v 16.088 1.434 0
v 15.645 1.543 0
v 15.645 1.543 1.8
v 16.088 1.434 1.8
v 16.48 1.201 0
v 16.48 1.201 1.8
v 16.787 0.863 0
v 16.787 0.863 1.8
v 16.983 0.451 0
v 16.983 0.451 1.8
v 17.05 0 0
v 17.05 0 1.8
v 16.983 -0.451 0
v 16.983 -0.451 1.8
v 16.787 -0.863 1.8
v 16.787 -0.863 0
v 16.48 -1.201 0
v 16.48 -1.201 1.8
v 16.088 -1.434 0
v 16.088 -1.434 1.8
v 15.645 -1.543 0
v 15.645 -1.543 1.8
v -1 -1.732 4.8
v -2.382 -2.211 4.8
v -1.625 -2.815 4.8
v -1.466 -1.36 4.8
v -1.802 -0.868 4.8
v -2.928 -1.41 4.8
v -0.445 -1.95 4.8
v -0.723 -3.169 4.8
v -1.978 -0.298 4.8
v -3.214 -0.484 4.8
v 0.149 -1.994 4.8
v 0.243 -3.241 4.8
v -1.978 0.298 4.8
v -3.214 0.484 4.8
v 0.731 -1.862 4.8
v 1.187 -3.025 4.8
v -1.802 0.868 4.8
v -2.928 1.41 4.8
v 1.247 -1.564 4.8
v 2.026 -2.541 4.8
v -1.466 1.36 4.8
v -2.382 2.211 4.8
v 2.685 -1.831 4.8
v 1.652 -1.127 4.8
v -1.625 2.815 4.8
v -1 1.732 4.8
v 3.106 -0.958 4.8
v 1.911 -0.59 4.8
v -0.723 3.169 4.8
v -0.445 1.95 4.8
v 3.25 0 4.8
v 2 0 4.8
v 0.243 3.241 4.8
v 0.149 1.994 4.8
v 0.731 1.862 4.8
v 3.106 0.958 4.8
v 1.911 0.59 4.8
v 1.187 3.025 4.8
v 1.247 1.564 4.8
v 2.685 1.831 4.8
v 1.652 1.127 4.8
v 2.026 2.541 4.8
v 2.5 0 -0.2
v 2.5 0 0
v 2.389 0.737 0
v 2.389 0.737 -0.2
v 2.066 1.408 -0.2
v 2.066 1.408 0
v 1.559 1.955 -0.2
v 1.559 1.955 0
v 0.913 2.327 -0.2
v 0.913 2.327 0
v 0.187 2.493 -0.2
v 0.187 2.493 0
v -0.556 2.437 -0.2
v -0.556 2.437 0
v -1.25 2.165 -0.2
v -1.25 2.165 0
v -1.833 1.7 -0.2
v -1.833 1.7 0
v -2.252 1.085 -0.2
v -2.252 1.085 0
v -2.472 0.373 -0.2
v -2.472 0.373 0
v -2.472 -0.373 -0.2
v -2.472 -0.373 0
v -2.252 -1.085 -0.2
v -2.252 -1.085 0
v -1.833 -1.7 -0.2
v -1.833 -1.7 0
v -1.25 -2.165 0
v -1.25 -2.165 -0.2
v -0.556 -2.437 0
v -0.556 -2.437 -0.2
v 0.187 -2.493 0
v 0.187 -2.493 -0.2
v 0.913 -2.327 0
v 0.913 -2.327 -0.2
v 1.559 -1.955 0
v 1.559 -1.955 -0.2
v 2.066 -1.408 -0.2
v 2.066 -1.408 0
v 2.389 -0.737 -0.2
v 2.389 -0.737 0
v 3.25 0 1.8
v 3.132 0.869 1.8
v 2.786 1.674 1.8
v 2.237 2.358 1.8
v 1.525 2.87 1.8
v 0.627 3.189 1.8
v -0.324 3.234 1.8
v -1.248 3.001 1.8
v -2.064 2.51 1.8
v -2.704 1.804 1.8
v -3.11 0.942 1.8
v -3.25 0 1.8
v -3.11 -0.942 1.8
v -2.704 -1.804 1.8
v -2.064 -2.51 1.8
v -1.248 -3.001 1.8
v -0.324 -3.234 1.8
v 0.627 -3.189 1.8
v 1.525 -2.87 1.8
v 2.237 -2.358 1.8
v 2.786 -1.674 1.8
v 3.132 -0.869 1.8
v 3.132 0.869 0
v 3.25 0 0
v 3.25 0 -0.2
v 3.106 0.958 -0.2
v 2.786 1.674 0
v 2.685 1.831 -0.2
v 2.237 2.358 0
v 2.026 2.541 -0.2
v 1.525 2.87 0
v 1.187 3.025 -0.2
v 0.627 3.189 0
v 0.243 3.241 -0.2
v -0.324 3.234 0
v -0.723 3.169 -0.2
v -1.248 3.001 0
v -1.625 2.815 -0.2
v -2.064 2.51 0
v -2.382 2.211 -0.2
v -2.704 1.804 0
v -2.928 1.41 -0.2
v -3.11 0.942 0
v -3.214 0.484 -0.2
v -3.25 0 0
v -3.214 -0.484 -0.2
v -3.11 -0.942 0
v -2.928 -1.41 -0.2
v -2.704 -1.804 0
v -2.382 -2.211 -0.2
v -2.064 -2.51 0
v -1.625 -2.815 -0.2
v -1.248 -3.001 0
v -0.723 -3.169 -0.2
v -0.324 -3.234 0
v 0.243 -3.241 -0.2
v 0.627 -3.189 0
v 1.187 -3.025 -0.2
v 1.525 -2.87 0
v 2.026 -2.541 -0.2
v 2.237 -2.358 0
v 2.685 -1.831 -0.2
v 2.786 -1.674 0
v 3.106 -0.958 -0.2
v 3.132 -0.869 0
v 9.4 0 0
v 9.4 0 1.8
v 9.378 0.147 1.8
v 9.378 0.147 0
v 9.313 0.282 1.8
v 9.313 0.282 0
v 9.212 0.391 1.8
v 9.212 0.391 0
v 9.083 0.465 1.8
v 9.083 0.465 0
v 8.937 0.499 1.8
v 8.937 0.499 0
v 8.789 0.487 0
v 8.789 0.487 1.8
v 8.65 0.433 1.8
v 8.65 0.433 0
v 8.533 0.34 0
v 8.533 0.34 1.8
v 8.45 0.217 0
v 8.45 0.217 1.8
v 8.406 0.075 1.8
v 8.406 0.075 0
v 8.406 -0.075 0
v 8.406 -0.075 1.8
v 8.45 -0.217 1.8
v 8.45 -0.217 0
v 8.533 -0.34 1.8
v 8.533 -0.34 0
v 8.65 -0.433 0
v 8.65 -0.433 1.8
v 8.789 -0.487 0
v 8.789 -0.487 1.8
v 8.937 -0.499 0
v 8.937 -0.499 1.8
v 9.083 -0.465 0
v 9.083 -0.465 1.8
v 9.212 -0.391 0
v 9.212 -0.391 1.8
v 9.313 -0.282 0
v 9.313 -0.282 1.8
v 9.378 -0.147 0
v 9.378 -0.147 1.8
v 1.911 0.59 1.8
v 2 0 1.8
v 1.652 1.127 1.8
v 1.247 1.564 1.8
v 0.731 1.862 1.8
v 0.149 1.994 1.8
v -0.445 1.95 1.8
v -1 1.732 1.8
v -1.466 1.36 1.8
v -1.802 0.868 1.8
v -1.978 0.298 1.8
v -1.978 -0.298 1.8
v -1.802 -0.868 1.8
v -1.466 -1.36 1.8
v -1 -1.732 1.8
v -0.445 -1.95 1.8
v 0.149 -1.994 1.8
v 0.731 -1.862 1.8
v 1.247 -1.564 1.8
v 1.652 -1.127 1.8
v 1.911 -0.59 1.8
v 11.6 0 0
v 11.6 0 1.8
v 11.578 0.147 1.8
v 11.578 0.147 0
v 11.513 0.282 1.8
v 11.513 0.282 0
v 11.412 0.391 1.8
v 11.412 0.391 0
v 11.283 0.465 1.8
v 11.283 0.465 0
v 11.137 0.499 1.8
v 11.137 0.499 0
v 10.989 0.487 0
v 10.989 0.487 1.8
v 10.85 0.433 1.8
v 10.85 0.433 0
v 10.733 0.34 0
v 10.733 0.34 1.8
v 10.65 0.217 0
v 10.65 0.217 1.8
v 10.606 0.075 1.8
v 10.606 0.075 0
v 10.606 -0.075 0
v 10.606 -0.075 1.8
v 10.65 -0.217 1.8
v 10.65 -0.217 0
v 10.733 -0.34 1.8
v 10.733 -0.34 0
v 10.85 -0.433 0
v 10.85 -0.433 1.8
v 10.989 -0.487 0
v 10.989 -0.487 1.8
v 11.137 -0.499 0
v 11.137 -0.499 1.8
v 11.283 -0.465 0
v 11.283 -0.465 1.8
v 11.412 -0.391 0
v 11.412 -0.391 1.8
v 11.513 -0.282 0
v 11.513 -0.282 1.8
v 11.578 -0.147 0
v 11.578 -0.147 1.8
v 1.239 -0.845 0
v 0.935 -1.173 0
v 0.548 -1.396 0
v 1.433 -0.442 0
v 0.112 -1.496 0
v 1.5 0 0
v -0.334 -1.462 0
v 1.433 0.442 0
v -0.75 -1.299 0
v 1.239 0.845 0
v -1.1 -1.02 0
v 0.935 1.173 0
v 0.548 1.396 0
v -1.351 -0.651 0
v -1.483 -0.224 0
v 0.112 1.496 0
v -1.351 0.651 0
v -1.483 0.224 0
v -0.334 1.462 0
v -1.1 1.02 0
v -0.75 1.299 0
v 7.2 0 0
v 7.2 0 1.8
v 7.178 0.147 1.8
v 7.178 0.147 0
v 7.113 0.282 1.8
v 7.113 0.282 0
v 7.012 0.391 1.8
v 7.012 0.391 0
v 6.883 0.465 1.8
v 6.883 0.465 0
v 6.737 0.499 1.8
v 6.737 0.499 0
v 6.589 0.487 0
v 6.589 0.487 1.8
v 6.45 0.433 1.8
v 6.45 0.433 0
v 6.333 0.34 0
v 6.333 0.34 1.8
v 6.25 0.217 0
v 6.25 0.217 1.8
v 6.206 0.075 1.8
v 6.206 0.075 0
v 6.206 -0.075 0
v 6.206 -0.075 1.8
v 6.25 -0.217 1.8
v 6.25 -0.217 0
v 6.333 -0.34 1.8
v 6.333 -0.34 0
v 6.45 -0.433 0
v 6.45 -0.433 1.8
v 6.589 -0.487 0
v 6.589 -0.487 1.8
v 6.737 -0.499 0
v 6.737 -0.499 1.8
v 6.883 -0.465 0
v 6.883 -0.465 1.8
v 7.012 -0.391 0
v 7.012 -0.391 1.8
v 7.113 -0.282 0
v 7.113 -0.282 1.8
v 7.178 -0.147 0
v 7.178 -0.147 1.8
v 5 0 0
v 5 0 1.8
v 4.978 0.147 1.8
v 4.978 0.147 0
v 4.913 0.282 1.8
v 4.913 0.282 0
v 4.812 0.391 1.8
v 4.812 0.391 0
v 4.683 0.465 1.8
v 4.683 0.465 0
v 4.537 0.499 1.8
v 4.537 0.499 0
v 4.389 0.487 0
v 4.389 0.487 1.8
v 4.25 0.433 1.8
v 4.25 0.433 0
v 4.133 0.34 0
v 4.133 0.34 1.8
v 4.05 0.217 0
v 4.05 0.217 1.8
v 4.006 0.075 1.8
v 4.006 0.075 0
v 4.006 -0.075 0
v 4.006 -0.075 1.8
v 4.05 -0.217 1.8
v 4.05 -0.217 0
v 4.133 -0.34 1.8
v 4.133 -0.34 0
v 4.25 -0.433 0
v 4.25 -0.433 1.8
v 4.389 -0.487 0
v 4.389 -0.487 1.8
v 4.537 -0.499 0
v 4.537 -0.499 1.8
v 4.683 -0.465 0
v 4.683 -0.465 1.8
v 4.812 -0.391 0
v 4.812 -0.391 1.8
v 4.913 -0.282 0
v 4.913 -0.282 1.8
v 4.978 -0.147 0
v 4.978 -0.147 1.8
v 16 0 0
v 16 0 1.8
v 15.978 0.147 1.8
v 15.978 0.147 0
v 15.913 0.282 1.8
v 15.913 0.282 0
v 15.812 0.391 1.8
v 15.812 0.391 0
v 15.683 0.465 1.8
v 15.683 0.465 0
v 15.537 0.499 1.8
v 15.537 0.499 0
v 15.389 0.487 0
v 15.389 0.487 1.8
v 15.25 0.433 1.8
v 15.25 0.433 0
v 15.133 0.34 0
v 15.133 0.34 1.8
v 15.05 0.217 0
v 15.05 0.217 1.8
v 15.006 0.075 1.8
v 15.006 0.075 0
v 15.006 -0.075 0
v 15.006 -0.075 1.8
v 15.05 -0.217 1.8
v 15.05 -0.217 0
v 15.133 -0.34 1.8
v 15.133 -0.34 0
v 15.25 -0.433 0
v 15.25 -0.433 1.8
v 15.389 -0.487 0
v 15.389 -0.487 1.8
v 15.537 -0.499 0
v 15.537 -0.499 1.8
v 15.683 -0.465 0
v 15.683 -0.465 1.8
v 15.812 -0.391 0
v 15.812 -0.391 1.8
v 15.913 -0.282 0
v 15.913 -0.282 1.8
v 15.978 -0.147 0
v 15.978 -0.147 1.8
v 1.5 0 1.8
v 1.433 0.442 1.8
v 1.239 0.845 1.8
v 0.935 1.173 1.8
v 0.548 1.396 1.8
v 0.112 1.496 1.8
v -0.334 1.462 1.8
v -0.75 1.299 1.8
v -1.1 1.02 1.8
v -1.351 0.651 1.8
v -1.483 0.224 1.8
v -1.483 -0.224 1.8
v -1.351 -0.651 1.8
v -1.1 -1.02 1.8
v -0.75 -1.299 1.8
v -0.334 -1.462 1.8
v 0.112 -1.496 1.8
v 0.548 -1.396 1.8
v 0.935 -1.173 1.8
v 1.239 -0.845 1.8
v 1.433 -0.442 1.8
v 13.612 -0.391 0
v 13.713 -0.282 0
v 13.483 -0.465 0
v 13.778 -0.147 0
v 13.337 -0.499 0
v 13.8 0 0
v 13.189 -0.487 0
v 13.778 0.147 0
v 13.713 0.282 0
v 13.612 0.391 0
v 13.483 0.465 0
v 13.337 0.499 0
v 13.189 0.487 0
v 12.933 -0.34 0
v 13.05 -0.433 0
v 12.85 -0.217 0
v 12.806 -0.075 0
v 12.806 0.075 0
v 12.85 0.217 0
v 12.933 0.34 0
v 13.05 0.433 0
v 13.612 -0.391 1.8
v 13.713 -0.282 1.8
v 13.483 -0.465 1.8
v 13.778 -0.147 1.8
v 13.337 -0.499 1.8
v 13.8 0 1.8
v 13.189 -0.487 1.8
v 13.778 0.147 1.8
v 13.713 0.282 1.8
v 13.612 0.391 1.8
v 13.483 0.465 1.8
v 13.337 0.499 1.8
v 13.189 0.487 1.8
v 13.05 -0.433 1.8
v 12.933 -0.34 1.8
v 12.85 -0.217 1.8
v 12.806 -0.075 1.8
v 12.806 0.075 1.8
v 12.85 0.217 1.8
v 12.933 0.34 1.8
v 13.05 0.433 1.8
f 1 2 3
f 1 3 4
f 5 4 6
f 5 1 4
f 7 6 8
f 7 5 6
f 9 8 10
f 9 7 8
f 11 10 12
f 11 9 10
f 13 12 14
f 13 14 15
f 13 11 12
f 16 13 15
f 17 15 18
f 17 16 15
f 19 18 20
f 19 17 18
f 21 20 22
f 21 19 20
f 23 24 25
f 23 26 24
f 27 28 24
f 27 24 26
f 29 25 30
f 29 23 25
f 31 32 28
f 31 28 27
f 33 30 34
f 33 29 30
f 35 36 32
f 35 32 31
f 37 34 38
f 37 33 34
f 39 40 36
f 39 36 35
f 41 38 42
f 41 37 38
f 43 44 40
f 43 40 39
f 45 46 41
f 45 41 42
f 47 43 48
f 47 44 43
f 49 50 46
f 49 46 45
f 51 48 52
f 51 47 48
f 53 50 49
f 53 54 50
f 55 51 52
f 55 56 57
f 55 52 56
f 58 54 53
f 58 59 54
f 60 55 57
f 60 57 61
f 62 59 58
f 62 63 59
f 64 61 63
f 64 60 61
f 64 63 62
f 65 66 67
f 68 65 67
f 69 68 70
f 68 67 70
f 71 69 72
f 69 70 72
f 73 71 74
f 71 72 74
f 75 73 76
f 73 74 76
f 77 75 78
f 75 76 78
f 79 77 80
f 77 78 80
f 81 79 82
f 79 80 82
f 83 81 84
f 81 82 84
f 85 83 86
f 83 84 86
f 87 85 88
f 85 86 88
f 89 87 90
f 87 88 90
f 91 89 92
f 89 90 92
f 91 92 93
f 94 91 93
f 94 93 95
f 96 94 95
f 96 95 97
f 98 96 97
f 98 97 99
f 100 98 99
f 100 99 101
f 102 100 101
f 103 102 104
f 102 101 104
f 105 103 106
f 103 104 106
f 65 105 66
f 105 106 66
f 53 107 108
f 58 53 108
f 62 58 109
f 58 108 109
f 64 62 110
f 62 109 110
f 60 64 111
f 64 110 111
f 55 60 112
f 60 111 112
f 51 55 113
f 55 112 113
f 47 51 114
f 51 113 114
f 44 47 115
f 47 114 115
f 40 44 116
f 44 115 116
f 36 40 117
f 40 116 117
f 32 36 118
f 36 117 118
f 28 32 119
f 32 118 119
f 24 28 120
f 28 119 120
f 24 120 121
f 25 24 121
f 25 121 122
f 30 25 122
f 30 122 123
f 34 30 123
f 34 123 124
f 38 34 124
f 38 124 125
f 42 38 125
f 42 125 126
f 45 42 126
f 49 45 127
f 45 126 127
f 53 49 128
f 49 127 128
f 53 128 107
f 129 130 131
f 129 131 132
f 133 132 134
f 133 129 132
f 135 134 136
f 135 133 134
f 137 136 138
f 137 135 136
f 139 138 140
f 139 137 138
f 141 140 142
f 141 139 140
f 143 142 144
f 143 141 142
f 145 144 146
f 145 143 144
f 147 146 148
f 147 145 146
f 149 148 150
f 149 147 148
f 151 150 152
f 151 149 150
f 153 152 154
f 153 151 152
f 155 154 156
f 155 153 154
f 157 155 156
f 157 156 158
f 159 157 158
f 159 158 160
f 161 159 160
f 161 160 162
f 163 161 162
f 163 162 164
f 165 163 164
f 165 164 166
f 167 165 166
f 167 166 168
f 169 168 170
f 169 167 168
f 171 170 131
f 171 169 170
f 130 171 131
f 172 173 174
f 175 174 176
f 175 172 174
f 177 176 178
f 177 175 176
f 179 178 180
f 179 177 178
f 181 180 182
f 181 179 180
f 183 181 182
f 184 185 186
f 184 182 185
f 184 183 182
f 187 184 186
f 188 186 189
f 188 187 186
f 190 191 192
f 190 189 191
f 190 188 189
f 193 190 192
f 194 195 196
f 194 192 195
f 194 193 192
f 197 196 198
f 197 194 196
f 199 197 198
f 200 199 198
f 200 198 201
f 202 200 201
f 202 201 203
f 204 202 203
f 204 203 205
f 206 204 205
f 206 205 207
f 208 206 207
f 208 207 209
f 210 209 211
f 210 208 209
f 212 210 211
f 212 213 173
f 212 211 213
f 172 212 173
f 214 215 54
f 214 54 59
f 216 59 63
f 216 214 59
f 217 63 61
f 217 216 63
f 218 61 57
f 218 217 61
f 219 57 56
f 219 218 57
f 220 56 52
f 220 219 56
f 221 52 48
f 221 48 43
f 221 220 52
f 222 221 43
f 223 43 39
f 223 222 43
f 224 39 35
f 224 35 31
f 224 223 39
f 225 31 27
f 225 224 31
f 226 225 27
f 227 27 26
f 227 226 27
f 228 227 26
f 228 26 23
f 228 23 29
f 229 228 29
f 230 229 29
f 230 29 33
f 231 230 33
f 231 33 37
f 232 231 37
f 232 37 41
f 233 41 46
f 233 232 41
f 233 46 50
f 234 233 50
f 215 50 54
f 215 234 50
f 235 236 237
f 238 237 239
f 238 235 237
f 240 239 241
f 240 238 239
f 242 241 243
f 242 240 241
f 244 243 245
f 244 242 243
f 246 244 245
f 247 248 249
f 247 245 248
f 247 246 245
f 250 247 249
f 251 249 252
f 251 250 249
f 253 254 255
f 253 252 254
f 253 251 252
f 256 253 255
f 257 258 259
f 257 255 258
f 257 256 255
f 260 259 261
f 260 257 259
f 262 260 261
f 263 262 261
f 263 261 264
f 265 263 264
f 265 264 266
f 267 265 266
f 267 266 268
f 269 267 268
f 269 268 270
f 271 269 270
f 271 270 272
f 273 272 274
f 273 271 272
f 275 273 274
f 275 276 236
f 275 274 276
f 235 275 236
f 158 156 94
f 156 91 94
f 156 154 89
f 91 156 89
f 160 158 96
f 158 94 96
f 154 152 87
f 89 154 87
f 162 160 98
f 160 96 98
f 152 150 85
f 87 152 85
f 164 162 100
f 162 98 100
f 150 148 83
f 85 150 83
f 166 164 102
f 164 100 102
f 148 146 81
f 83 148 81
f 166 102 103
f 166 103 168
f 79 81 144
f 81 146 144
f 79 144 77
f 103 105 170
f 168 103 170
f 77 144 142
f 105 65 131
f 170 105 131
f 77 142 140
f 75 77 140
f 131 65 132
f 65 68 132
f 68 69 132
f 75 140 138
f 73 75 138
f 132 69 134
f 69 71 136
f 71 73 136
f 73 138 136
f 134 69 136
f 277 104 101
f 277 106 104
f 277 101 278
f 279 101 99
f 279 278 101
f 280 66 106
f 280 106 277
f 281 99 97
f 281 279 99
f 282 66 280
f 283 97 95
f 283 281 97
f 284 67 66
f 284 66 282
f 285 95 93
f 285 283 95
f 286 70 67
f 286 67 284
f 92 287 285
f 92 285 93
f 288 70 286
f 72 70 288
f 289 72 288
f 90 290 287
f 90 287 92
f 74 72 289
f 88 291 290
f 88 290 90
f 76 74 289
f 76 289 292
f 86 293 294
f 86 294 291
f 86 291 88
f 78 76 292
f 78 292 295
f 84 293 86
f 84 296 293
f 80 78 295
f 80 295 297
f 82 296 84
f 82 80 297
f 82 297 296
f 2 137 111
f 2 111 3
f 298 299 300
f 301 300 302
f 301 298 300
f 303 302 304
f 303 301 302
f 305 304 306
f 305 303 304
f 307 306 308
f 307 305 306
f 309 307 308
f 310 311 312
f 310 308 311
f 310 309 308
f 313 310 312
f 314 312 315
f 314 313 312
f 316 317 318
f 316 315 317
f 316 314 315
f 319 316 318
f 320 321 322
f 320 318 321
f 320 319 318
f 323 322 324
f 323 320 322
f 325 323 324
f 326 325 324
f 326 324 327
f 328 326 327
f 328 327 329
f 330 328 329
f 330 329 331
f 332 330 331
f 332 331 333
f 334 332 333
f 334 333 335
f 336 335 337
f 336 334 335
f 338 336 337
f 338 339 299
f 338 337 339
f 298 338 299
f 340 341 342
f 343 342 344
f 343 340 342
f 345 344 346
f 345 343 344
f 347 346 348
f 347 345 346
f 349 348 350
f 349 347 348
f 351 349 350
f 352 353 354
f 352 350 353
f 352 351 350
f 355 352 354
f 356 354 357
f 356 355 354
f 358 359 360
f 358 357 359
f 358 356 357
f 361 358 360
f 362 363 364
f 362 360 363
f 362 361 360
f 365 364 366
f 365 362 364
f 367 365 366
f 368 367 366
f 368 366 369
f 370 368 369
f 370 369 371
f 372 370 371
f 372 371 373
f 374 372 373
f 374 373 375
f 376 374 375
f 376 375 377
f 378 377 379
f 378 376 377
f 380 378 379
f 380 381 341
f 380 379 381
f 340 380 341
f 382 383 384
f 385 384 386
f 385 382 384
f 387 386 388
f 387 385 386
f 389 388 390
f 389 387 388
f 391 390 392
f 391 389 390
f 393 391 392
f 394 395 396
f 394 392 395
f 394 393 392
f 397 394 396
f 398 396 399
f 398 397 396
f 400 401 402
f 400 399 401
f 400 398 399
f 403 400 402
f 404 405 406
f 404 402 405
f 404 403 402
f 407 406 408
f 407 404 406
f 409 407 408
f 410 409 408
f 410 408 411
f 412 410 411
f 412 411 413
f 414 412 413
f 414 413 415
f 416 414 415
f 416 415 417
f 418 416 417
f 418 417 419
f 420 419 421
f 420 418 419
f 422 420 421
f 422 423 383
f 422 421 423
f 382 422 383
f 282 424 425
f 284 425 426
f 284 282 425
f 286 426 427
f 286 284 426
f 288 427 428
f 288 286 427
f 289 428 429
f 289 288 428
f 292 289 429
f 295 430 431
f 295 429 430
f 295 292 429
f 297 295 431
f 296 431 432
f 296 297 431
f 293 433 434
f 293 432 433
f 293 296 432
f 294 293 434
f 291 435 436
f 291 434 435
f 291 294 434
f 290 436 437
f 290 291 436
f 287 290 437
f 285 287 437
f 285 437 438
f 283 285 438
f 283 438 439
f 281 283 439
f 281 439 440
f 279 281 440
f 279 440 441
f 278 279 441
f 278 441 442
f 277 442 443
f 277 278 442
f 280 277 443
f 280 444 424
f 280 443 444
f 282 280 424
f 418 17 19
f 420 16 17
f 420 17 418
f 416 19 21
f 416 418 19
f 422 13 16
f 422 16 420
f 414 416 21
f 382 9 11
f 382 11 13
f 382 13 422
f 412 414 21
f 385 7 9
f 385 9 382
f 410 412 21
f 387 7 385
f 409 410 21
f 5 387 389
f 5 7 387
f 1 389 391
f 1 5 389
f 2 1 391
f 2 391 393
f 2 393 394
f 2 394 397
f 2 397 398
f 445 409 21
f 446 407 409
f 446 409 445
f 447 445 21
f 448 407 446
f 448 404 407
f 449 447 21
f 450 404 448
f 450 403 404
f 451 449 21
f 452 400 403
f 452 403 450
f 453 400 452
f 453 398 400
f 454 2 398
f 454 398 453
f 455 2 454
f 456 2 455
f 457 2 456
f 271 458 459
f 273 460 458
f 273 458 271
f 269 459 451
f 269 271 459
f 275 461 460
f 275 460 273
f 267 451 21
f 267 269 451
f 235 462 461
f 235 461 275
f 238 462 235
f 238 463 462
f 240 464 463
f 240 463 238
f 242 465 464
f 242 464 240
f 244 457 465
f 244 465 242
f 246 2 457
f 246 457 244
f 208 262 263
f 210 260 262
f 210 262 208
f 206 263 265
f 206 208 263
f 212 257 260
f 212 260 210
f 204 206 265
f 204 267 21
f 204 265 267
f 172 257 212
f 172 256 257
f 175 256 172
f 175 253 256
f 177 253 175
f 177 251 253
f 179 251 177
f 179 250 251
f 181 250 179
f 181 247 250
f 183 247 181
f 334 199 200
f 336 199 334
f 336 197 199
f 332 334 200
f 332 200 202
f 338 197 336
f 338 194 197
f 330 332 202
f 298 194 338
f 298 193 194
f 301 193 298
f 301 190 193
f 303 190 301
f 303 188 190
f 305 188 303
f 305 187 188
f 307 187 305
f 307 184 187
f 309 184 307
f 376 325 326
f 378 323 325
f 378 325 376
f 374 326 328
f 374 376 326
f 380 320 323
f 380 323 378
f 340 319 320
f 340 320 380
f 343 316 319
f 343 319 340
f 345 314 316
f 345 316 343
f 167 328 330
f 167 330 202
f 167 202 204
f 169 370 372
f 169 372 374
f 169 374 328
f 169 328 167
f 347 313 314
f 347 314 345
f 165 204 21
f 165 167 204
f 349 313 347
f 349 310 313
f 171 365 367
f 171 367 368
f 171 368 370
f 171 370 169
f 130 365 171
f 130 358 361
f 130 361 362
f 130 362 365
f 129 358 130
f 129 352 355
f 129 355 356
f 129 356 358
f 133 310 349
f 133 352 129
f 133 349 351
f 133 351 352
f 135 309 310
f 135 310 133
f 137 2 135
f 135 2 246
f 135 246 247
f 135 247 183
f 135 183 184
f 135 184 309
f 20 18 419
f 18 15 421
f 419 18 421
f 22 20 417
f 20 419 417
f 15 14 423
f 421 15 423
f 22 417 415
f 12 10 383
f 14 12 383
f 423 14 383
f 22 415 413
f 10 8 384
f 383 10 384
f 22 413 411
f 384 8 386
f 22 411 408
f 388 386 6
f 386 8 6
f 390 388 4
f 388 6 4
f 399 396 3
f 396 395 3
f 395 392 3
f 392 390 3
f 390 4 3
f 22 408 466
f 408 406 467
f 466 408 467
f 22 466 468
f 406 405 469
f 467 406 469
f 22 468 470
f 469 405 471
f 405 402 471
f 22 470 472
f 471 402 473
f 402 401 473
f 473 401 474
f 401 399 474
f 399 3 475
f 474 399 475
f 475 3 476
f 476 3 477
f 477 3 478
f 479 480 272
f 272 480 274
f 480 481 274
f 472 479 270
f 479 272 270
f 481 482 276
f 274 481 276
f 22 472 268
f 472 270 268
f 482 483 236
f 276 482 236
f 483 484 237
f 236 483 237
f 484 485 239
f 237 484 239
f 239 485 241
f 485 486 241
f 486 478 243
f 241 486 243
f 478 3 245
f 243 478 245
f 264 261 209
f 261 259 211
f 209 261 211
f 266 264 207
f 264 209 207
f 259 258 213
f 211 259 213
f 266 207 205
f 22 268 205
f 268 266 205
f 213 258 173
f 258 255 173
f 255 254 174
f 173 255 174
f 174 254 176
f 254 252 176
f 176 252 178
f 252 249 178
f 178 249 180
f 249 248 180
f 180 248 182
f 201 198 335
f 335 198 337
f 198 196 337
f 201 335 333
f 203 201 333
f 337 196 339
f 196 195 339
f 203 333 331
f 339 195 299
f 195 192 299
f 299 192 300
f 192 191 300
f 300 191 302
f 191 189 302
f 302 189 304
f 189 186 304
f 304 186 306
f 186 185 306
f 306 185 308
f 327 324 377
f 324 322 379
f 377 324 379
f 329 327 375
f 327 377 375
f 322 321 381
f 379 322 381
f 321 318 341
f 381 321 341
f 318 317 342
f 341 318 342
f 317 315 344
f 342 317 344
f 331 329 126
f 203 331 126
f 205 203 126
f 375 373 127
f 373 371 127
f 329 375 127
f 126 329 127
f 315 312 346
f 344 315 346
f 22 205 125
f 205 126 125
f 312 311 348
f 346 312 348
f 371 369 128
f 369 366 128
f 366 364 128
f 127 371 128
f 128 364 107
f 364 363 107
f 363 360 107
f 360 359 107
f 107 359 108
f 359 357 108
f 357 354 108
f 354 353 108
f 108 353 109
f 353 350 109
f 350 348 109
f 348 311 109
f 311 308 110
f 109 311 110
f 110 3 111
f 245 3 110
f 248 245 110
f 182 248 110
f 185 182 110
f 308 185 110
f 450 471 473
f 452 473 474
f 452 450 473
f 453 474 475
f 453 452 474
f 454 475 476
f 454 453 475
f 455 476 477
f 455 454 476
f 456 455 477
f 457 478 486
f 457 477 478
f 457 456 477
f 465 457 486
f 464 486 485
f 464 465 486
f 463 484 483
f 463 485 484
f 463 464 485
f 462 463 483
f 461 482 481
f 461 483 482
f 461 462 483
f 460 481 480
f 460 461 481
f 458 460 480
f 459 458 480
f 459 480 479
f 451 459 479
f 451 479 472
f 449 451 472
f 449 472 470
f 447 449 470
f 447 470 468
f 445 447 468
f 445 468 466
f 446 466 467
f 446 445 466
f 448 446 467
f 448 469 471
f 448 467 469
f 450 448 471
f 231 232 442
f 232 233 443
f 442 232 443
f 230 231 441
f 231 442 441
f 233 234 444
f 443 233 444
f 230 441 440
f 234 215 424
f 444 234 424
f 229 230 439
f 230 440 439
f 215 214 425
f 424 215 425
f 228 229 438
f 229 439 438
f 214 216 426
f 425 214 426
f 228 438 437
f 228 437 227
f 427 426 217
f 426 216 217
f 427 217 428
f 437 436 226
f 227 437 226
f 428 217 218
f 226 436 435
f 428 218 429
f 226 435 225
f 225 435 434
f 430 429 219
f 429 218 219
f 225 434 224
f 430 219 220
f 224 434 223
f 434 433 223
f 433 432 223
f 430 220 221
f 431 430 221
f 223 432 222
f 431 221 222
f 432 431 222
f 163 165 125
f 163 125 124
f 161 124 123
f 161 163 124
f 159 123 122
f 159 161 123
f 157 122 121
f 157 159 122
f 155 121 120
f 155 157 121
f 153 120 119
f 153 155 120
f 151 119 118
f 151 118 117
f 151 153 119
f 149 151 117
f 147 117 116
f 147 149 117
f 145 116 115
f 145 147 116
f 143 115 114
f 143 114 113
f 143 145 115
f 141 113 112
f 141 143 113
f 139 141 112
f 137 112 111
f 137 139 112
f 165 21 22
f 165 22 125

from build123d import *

# Parameters (mm, degrees)
BOSS_EXTRUDE1_DEPTH = 1.8
SKETCH2_R           = 3.25
SKETCH2_R_2         = 2.5
BOSS_EXTRUDE3_DEPTH = 0.2
SKETCH5_R           = 3.25
SKETCH5_R_2         = 2
BOSS_EXTRUDE4_DEPTH = 3
CUT_EXTRUDE1_REACH  = 6.8
SKETCH6_R           = 1.5
CUT_EXTRUDE2_REACH  = 6.8
SKETCH8_R           = 0.5


with BuildPart() as part:
    # Sketch1 → Boss-Extrude1 (new body)
    with BuildSketch(Plane.XY):
        with BuildLine():
            Line((1.525163579, 2.869908719), (15.645, 1.543202838))
            ThreePointArc((15.645, 1.543202838), (17.05, 0), (15.645, -1.543202838))
            Line((15.645, -1.543202838), (1.525163579, -2.869908719))
            ThreePointArc((1.525163579, -2.869908719), (-3.25, 0), (1.525163579, 2.869908719))
        make_face()
    extrude(amount=BOSS_EXTRUDE1_DEPTH)

    # Sketch2 → Boss-Extrude3 (add)
    with BuildSketch(Plane.XY):
        Circle(SKETCH2_R)
        Circle(SKETCH2_R_2, mode=Mode.SUBTRACT)
    extrude(amount=-BOSS_EXTRUDE3_DEPTH)

    # Sketch5 → Boss-Extrude4 (add)
    with BuildSketch(Plane.XY.offset(1.8)):
        Circle(SKETCH5_R)
        Circle(SKETCH5_R_2, mode=Mode.SUBTRACT)
    extrude(amount=BOSS_EXTRUDE4_DEPTH)

    # Sketch6 → Cut-Extrude1 (cut, up to next)
    with BuildSketch(Plane.XY, mode=Mode.PRIVATE) as cut_extrude1_sk1:
        Circle(SKETCH6_R)
    cut_extrude1_tool1 = extrude(cut_extrude1_sk1.sketch, amount=CUT_EXTRUDE1_REACH, mode=Mode.PRIVATE) & part.part
    add(cut_extrude1_tool1.solids().sort_by_distance((0, 0, 0))[0], mode=Mode.SUBTRACT)

    # Sketch8 → Cut-Extrude2 (cut, up to next)
    with BuildSketch(Plane.XY, mode=Mode.PRIVATE) as cut_extrude2_sk1:
        with Locations((15.5, 0)):
            Circle(SKETCH8_R)
    cut_extrude2_tool1 = extrude(cut_extrude2_sk1.sketch, amount=CUT_EXTRUDE2_REACH, mode=Mode.PRIVATE) & part.part
    add(cut_extrude2_tool1.solids().sort_by_distance((15.5, 0, 0))[0], mode=Mode.SUBTRACT)
    # Sketch8 → Cut-Extrude2 (cut, up to next)
    with BuildSketch(Plane.XY, mode=Mode.PRIVATE) as cut_extrude2_sk2:
        with Locations((13.3, 0)):
            Circle(SKETCH8_R)
    cut_extrude2_tool2 = extrude(cut_extrude2_sk2.sketch, amount=CUT_EXTRUDE2_REACH, mode=Mode.PRIVATE) & part.part
    add(cut_extrude2_tool2.solids().sort_by_distance((13.3, 0, 0))[0], mode=Mode.SUBTRACT)
    # Sketch8 → Cut-Extrude2 (cut, up to next)
    with BuildSketch(Plane.XY, mode=Mode.PRIVATE) as cut_extrude2_sk3:
        with Locations((11.1, 0)):
            Circle(SKETCH8_R)
    cut_extrude2_tool3 = extrude(cut_extrude2_sk3.sketch, amount=CUT_EXTRUDE2_REACH, mode=Mode.PRIVATE) & part.part
    add(cut_extrude2_tool3.solids().sort_by_distance((11.1, 0, 0))[0], mode=Mode.SUBTRACT)
    # Sketch8 → Cut-Extrude2 (cut, up to next)
    with BuildSketch(Plane.XY, mode=Mode.PRIVATE) as cut_extrude2_sk4:
        with Locations((8.9, 0)):
            Circle(SKETCH8_R)
    cut_extrude2_tool4 = extrude(cut_extrude2_sk4.sketch, amount=CUT_EXTRUDE2_REACH, mode=Mode.PRIVATE) & part.part
    add(cut_extrude2_tool4.solids().sort_by_distance((8.9, 0, 0))[0], mode=Mode.SUBTRACT)
    # Sketch8 → Cut-Extrude2 (cut, up to next)
    with BuildSketch(Plane.XY, mode=Mode.PRIVATE) as cut_extrude2_sk5:
        with Locations((6.7, 0)):
            Circle(SKETCH8_R)
    cut_extrude2_tool5 = extrude(cut_extrude2_sk5.sketch, amount=CUT_EXTRUDE2_REACH, mode=Mode.PRIVATE) & part.part
    add(cut_extrude2_tool5.solids().sort_by_distance((6.7, 0, 0))[0], mode=Mode.SUBTRACT)
    # Sketch8 → Cut-Extrude2 (cut, up to next)
    with BuildSketch(Plane.XY, mode=Mode.PRIVATE) as cut_extrude2_sk6:
        with Locations((4.5, 0)):
            Circle(SKETCH8_R)
    cut_extrude2_tool6 = extrude(cut_extrude2_sk6.sketch, amount=CUT_EXTRUDE2_REACH, mode=Mode.PRIVATE) & part.part
    add(cut_extrude2_tool6.solids().sort_by_distance((4.5, 0, 0))[0], mode=Mode.SUBTRACT)


solid = part.part
